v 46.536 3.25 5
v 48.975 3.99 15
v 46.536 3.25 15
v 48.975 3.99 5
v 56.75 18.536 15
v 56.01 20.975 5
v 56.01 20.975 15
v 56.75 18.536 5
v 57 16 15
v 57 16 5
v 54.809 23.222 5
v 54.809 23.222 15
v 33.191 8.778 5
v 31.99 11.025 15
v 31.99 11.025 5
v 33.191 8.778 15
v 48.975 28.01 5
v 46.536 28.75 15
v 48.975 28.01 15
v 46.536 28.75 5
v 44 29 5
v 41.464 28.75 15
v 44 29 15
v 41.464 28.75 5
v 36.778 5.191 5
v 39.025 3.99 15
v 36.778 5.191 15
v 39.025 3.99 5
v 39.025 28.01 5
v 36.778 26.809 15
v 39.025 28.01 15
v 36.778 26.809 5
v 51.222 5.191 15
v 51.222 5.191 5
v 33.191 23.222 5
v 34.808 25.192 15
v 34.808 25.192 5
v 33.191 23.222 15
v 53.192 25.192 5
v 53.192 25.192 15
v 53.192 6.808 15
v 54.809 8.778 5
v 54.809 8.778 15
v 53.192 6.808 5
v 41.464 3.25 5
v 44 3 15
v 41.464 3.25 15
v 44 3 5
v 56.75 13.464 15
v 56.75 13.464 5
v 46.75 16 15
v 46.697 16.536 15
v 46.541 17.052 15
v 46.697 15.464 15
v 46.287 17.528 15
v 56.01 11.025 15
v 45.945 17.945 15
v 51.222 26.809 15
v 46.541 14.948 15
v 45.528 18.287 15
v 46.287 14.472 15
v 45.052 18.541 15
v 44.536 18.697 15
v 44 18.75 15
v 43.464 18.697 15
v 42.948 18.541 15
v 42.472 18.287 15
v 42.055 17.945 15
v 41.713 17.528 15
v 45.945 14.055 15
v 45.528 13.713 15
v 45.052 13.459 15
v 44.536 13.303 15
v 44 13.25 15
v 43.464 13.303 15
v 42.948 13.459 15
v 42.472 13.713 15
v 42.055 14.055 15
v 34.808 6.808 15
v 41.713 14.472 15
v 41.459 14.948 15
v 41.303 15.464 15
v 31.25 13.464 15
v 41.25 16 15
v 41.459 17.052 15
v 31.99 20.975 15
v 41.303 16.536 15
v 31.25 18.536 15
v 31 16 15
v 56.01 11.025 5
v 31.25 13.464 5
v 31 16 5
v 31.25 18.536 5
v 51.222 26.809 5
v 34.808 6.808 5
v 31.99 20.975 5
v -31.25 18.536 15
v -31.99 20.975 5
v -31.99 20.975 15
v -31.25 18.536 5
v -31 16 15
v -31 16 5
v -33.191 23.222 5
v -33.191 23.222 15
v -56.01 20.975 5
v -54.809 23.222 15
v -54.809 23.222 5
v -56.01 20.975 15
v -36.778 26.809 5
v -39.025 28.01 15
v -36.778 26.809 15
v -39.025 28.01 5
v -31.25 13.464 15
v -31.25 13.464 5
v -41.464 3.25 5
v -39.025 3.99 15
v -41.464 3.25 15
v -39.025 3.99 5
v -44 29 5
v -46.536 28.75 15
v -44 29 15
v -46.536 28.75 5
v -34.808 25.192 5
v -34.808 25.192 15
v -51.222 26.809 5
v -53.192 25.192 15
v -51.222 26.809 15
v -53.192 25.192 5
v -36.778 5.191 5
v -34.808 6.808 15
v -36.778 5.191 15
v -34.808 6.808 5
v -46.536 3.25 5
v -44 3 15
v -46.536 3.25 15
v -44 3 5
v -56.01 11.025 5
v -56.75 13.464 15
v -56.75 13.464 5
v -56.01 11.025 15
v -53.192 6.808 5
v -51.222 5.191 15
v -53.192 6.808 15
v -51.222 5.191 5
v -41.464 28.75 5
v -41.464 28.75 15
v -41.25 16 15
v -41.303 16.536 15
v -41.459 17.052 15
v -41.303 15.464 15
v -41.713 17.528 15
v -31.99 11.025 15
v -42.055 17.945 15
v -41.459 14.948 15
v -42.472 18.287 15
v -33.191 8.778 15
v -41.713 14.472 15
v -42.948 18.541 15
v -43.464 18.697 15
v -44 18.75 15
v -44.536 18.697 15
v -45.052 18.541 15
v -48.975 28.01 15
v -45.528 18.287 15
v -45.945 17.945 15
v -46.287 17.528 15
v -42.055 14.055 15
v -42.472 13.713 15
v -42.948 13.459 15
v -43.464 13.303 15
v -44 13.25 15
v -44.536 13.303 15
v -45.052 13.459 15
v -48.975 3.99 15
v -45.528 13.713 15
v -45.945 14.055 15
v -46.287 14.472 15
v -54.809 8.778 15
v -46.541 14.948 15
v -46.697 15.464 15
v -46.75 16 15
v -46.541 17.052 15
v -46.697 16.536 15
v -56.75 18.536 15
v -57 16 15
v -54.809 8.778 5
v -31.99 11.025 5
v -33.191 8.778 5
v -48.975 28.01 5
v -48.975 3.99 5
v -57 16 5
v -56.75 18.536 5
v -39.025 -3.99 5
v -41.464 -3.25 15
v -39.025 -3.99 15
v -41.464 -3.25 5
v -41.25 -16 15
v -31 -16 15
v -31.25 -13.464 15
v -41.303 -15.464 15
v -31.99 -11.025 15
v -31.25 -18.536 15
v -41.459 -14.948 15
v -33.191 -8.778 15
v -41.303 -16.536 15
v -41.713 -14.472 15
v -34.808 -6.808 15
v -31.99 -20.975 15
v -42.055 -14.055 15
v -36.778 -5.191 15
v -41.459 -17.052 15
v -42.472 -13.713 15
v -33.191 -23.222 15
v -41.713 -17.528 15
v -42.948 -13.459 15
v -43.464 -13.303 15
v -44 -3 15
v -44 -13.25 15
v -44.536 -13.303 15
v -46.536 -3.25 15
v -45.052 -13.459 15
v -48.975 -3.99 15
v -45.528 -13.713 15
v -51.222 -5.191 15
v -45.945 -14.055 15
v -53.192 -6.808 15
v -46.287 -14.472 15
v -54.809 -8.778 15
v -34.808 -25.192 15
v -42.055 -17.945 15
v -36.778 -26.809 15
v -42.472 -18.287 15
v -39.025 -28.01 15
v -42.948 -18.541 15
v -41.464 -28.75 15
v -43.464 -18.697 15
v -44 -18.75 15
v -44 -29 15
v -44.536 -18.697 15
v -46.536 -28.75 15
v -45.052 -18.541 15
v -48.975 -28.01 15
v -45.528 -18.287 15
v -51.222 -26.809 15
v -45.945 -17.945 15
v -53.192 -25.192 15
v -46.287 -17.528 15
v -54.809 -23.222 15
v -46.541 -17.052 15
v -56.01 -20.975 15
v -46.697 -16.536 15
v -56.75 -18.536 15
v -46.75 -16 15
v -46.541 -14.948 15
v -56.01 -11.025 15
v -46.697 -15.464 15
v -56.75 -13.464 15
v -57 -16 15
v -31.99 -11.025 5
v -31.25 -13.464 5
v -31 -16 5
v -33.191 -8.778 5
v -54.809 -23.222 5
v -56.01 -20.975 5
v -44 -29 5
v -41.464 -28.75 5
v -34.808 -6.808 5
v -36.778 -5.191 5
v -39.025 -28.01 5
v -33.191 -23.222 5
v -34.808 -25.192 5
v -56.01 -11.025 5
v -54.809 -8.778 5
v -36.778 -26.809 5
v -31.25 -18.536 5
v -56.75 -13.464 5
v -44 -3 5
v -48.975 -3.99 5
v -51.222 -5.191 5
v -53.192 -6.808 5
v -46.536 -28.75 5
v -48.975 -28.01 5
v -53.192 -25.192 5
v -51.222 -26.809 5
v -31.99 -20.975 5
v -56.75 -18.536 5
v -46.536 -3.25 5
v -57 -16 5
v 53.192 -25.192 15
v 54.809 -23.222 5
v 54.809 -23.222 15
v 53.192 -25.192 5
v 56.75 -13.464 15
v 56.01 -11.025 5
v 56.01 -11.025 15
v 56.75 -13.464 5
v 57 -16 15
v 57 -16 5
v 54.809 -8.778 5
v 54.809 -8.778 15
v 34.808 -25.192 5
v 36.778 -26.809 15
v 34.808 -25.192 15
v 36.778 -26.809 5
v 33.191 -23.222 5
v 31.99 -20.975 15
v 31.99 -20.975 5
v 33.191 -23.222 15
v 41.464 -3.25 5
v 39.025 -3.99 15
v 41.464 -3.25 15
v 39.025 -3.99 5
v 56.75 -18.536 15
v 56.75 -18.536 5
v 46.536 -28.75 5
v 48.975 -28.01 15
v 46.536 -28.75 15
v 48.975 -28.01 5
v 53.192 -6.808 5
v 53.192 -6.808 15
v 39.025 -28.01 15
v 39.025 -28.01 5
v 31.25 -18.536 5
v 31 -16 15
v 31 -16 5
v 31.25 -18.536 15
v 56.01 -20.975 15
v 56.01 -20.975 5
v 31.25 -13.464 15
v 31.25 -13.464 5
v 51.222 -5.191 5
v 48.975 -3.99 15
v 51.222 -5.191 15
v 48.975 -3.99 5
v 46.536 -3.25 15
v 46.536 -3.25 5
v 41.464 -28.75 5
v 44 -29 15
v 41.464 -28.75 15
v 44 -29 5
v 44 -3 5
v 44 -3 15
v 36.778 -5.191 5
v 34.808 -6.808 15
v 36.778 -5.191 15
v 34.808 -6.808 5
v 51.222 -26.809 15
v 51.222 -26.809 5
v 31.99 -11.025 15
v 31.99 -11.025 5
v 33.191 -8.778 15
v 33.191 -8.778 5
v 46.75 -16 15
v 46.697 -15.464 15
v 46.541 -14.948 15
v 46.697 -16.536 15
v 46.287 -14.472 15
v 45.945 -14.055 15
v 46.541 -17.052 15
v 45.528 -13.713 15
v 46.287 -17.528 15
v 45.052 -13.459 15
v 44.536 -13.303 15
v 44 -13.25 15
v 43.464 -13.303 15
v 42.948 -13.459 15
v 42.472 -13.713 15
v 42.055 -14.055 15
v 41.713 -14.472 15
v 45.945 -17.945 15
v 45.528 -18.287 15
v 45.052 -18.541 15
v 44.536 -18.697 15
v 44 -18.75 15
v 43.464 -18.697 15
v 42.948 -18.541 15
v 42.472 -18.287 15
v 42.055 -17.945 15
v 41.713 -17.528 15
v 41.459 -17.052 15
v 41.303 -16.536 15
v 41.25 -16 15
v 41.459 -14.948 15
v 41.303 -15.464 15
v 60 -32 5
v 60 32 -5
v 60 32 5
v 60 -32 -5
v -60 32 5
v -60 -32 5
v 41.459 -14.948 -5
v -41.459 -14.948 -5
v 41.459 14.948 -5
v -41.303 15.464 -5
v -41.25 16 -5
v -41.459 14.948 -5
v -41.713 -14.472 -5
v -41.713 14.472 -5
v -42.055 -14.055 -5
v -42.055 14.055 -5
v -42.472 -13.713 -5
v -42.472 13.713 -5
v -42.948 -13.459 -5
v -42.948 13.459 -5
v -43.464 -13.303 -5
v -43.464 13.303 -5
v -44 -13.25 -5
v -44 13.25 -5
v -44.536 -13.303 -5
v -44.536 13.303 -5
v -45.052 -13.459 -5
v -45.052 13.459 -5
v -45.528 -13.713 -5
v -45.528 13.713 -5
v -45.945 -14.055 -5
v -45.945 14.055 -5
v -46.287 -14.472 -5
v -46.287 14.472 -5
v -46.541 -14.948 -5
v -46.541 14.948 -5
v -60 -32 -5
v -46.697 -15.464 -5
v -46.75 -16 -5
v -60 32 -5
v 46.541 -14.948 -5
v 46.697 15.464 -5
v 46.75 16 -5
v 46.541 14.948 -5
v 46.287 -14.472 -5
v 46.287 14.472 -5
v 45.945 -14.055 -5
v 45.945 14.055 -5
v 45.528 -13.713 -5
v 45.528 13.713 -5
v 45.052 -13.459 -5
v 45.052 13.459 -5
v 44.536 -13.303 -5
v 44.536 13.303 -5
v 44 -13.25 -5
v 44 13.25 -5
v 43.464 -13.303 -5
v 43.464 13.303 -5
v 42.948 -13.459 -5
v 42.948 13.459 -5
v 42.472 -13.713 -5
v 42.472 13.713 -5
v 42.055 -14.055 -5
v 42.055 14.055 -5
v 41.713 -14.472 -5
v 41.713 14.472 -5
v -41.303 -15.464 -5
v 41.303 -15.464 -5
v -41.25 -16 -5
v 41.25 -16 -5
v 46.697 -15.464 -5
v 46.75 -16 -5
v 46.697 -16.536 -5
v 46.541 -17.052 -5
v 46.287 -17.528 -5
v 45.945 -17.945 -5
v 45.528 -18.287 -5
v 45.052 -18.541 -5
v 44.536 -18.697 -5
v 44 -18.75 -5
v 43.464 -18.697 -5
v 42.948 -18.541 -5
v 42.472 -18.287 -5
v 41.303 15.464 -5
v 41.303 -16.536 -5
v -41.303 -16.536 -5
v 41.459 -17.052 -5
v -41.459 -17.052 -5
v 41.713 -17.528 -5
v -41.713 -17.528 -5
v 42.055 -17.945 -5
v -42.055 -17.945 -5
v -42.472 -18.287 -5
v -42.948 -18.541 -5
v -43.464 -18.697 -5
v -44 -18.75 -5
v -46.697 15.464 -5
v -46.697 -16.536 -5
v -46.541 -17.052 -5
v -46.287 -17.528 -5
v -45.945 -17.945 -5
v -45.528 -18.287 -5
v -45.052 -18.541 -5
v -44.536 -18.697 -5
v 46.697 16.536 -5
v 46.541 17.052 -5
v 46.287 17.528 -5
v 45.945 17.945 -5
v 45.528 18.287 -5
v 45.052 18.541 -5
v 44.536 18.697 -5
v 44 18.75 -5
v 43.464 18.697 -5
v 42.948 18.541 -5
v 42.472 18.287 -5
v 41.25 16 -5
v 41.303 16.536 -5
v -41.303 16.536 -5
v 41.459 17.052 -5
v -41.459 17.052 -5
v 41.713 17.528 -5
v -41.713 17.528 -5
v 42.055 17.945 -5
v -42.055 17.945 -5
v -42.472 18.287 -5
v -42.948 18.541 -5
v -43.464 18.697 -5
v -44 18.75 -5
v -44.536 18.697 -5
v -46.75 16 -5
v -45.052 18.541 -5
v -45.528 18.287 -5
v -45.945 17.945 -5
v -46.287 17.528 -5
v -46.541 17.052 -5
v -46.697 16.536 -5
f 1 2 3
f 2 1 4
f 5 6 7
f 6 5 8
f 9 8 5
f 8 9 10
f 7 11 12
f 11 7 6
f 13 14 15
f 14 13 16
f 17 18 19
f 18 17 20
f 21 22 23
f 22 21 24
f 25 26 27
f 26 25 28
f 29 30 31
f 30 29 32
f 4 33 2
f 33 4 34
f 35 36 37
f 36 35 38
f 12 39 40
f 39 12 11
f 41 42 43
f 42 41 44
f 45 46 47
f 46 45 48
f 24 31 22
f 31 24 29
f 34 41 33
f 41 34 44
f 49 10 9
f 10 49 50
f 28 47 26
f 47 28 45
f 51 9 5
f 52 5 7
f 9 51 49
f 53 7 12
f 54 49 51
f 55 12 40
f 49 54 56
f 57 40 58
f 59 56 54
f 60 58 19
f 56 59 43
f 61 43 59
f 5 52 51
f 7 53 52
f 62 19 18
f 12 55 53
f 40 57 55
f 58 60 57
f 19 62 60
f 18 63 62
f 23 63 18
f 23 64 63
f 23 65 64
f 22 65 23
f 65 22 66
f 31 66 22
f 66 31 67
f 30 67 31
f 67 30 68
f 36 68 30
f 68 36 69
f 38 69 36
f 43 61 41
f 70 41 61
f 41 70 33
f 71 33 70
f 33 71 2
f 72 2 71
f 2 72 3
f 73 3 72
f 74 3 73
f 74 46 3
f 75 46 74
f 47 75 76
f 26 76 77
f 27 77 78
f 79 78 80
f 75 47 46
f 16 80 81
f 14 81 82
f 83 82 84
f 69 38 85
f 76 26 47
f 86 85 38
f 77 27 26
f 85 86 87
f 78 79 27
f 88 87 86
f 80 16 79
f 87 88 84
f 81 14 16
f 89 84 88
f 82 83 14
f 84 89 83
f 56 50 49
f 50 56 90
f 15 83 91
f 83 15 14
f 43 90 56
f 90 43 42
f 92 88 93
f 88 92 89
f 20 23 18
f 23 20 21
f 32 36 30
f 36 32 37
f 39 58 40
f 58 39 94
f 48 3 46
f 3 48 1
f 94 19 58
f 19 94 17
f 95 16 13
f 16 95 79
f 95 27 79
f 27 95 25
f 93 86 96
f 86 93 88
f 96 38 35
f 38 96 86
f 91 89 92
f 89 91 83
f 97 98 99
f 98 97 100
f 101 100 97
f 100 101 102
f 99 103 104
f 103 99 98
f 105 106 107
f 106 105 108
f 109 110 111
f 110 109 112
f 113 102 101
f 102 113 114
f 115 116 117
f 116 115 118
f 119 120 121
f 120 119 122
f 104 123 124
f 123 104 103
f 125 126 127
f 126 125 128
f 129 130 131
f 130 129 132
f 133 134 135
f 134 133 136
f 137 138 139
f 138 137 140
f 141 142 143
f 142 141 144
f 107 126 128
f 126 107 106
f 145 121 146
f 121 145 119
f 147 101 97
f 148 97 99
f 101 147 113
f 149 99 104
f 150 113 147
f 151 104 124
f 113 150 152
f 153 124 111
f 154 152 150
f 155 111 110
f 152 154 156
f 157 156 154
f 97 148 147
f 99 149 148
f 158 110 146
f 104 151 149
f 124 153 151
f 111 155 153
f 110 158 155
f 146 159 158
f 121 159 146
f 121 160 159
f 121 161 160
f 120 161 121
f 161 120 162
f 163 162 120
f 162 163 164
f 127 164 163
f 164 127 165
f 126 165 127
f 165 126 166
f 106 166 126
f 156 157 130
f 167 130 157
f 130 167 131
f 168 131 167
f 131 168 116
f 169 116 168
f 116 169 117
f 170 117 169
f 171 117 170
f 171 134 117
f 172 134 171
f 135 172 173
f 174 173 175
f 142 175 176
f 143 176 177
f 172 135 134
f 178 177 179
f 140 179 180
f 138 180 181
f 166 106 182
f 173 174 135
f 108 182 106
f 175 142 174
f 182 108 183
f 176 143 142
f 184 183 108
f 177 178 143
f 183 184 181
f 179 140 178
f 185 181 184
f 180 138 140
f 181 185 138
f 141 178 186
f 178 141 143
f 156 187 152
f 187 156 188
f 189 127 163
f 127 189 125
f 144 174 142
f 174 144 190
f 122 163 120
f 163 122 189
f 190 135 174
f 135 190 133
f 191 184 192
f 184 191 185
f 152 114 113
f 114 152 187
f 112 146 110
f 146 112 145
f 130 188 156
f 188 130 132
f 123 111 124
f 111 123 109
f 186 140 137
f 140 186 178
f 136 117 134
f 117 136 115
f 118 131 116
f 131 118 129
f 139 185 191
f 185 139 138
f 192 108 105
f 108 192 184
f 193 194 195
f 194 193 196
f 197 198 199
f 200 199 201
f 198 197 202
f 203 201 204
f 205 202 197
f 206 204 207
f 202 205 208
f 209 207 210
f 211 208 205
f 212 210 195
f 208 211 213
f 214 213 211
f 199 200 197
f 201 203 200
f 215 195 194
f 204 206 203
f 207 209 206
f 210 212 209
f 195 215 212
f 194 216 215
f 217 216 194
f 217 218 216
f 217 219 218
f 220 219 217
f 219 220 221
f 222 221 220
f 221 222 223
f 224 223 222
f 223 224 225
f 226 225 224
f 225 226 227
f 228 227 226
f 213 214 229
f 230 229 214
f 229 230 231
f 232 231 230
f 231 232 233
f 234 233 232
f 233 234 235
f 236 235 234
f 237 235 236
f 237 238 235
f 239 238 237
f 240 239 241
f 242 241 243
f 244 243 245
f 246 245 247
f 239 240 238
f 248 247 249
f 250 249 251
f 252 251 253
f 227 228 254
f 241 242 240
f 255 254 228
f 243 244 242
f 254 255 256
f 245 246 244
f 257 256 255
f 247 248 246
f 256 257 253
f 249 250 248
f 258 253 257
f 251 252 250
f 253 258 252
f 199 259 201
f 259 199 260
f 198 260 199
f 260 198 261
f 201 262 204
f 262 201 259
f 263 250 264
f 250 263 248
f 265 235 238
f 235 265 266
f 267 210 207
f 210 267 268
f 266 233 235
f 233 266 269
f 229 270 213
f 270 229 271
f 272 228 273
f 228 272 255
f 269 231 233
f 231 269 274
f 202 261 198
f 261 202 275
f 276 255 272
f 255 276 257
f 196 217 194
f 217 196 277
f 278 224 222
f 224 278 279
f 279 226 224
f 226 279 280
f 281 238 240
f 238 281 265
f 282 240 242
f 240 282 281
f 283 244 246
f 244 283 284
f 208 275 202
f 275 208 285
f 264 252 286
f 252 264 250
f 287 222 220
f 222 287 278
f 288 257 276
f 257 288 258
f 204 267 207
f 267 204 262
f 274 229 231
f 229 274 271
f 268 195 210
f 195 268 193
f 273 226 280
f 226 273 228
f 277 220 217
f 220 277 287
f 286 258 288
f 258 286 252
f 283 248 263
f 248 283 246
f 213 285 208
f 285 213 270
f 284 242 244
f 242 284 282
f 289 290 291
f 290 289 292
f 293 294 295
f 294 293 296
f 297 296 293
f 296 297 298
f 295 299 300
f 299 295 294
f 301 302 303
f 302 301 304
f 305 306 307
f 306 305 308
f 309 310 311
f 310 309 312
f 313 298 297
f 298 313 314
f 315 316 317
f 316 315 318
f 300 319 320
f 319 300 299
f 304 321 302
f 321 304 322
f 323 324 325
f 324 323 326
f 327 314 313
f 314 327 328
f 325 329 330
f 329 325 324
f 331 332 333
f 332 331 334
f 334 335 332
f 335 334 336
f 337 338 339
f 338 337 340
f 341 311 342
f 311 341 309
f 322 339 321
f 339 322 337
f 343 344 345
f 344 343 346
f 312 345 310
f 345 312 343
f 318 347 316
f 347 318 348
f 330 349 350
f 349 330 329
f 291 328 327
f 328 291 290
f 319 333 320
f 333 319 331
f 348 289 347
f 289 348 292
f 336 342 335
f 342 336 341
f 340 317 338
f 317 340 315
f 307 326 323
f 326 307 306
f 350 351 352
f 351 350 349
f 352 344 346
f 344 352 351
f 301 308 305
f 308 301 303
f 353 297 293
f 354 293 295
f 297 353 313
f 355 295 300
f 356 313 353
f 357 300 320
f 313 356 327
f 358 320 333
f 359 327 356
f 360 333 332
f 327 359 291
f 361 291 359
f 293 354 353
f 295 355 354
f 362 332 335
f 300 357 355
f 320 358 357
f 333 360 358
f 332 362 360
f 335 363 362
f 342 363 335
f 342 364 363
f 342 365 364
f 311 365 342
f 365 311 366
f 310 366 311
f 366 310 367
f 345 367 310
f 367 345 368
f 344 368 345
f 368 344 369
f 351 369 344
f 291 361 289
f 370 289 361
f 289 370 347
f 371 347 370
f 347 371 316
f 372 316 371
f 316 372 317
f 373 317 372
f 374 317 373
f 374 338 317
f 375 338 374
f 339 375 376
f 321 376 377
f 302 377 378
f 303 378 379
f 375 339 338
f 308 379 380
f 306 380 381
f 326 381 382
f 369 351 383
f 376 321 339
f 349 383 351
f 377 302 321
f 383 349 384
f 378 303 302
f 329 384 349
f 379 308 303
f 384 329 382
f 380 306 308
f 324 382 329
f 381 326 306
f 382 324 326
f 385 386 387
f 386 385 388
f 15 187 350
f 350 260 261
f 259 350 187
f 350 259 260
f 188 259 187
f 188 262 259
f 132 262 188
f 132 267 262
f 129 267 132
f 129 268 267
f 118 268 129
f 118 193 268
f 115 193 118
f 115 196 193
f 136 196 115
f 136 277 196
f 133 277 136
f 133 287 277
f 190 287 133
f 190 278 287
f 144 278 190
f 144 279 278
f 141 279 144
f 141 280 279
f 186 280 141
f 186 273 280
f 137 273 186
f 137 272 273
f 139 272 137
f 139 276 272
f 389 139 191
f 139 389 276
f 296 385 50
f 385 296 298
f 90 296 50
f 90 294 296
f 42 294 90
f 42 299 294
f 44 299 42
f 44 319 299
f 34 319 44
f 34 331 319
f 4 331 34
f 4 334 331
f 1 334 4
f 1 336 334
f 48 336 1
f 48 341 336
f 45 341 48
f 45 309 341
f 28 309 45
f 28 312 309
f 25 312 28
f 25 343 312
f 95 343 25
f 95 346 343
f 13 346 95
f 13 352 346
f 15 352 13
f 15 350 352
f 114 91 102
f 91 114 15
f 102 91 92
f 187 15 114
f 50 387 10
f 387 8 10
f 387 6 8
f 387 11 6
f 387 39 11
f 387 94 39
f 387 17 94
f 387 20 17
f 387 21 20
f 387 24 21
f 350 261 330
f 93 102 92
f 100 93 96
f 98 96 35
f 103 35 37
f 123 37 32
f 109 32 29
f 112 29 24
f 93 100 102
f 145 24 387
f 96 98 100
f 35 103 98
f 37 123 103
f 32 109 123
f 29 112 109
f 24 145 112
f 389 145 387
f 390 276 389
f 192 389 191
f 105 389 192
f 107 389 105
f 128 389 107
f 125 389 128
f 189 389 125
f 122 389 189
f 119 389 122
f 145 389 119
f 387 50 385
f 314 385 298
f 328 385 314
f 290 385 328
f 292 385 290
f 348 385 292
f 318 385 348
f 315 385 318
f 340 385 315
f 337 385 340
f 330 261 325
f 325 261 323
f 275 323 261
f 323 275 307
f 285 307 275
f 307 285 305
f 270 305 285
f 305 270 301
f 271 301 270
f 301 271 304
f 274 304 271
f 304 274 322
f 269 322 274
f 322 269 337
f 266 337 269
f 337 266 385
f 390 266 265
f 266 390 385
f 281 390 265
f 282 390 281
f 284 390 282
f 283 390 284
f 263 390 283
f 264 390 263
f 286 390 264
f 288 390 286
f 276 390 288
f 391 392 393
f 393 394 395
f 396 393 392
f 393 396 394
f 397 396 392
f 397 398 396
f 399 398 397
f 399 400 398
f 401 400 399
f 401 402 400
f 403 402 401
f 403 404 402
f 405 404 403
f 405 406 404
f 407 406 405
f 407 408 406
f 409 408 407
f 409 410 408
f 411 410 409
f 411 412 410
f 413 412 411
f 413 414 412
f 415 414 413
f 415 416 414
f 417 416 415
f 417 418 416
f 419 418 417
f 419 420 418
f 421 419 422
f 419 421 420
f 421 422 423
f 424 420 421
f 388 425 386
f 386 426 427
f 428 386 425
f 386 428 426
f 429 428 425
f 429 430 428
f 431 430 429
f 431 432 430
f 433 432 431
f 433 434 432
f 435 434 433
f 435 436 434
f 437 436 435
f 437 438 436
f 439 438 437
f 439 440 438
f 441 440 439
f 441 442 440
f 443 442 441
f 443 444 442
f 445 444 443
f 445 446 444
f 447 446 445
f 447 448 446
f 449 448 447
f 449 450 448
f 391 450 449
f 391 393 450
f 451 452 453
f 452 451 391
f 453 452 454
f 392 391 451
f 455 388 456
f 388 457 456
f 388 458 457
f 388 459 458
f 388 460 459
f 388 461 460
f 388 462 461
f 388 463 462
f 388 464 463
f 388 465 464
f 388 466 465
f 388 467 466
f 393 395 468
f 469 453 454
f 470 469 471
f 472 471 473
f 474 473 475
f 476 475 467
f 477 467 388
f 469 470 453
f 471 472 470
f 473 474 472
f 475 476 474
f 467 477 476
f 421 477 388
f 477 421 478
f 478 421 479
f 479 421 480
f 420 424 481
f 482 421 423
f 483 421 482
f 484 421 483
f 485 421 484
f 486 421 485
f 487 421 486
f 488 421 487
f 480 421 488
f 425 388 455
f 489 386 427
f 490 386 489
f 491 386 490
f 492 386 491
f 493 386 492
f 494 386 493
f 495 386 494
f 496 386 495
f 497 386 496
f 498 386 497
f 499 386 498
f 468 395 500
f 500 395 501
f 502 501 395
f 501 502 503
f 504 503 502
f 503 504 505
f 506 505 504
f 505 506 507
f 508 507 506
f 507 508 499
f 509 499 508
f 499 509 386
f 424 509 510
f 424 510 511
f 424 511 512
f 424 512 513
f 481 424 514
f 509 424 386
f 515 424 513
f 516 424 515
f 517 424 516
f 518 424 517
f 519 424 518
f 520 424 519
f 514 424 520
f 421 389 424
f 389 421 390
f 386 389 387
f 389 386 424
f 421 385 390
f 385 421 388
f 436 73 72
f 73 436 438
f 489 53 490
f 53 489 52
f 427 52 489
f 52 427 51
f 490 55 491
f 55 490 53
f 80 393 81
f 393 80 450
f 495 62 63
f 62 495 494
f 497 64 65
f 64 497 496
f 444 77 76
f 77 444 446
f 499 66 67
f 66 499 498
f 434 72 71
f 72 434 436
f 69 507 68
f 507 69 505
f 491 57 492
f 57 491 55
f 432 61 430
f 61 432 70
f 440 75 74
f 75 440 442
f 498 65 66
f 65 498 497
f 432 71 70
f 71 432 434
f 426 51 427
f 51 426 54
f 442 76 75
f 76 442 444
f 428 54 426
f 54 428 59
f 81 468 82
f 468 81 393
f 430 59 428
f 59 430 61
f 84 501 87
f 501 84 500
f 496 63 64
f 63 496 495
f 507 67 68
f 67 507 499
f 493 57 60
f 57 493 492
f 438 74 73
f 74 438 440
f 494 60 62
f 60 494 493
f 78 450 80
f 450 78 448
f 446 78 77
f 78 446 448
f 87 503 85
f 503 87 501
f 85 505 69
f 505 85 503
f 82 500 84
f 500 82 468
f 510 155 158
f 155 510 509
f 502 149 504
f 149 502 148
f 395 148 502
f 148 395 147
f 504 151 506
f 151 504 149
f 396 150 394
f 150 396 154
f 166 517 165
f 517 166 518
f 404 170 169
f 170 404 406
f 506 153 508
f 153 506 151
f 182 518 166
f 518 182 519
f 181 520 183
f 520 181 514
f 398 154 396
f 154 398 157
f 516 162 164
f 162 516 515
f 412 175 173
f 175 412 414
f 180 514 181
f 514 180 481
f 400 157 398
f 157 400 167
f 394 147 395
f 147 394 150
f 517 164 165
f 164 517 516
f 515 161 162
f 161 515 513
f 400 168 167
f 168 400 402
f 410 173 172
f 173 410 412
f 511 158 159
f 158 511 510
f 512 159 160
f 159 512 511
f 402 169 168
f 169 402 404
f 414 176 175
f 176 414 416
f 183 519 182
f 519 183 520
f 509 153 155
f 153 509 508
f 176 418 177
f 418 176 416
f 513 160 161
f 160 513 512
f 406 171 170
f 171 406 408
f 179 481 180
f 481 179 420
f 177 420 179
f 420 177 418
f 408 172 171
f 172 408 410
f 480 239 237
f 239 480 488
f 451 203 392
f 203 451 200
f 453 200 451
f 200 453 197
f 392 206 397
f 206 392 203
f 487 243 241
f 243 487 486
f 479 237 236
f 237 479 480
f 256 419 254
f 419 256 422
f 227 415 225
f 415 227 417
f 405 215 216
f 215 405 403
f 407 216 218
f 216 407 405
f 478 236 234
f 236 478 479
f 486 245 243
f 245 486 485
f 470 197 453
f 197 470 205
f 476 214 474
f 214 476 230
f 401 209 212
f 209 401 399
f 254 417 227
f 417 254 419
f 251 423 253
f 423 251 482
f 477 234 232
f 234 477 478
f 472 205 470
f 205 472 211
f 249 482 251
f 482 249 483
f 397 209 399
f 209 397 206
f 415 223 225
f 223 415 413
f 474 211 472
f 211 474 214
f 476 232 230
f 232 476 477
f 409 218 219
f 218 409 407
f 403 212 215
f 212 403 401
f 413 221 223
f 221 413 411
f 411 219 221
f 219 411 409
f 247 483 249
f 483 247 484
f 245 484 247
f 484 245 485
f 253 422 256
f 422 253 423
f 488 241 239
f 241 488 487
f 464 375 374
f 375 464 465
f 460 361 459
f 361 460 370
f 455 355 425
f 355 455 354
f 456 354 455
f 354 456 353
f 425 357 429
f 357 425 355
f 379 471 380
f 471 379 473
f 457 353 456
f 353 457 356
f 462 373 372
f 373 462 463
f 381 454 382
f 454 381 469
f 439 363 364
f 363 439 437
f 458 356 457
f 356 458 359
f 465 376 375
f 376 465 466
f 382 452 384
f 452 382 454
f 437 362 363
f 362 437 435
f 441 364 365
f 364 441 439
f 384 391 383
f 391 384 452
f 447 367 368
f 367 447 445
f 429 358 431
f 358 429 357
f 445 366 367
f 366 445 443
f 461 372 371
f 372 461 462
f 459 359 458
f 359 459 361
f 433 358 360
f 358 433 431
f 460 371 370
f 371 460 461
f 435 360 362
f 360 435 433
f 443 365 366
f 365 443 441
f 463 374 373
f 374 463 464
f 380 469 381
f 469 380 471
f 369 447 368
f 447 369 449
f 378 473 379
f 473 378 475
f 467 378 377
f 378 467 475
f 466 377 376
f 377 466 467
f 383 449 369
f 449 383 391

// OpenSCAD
$fn = 32;

// ----------------------------------------------------------------------
// Anchor pads 120 x 64 x 20
// four corner bosses with anchor holes
// ----------------------------------------------------------------------

// --- parameters (mm) ---
plate = [120, 64, 10];  // base plate size (x, y, z)
pads = 4;               // boss count, one per corner
edge = 16;              // boss centre offset from the plate edge
boss_d = 26;            // boss diameter
boss_h = 10;            // boss height above the base plate
hole_d = 5.5;           // hole diameter

// --- derived feature positions (mm) ---
height = plate[2] + boss_h;      // = 20   overall height of the part
corner_x = plate[0] / 2 - edge;  // = 44   boss centre X
corner_y = plate[1] / 2 - edge;  // = 16   boss centre Y
feature_centers = [
  [corner_x, corner_y],
  [-corner_x, corner_y],
  [-corner_x, -corner_y],
  [corner_x, -corner_y]
];   // boss centres, anchor holes are drilled there

// base plate, four bosses standing on it, anchor holes all the way through
difference() {
  union() {
    cube(plate, center = true);
    for (centre = feature_centers)
      translate([centre[0], centre[1], plate[2] / 2 - 1])
        cylinder(d = boss_d, h = boss_h + 1);
  }
  for (centre = feature_centers)
    translate([centre[0], centre[1], -height])
      cylinder(d = hole_d, h = 2 * height + 2);  // through boss and plate
}
